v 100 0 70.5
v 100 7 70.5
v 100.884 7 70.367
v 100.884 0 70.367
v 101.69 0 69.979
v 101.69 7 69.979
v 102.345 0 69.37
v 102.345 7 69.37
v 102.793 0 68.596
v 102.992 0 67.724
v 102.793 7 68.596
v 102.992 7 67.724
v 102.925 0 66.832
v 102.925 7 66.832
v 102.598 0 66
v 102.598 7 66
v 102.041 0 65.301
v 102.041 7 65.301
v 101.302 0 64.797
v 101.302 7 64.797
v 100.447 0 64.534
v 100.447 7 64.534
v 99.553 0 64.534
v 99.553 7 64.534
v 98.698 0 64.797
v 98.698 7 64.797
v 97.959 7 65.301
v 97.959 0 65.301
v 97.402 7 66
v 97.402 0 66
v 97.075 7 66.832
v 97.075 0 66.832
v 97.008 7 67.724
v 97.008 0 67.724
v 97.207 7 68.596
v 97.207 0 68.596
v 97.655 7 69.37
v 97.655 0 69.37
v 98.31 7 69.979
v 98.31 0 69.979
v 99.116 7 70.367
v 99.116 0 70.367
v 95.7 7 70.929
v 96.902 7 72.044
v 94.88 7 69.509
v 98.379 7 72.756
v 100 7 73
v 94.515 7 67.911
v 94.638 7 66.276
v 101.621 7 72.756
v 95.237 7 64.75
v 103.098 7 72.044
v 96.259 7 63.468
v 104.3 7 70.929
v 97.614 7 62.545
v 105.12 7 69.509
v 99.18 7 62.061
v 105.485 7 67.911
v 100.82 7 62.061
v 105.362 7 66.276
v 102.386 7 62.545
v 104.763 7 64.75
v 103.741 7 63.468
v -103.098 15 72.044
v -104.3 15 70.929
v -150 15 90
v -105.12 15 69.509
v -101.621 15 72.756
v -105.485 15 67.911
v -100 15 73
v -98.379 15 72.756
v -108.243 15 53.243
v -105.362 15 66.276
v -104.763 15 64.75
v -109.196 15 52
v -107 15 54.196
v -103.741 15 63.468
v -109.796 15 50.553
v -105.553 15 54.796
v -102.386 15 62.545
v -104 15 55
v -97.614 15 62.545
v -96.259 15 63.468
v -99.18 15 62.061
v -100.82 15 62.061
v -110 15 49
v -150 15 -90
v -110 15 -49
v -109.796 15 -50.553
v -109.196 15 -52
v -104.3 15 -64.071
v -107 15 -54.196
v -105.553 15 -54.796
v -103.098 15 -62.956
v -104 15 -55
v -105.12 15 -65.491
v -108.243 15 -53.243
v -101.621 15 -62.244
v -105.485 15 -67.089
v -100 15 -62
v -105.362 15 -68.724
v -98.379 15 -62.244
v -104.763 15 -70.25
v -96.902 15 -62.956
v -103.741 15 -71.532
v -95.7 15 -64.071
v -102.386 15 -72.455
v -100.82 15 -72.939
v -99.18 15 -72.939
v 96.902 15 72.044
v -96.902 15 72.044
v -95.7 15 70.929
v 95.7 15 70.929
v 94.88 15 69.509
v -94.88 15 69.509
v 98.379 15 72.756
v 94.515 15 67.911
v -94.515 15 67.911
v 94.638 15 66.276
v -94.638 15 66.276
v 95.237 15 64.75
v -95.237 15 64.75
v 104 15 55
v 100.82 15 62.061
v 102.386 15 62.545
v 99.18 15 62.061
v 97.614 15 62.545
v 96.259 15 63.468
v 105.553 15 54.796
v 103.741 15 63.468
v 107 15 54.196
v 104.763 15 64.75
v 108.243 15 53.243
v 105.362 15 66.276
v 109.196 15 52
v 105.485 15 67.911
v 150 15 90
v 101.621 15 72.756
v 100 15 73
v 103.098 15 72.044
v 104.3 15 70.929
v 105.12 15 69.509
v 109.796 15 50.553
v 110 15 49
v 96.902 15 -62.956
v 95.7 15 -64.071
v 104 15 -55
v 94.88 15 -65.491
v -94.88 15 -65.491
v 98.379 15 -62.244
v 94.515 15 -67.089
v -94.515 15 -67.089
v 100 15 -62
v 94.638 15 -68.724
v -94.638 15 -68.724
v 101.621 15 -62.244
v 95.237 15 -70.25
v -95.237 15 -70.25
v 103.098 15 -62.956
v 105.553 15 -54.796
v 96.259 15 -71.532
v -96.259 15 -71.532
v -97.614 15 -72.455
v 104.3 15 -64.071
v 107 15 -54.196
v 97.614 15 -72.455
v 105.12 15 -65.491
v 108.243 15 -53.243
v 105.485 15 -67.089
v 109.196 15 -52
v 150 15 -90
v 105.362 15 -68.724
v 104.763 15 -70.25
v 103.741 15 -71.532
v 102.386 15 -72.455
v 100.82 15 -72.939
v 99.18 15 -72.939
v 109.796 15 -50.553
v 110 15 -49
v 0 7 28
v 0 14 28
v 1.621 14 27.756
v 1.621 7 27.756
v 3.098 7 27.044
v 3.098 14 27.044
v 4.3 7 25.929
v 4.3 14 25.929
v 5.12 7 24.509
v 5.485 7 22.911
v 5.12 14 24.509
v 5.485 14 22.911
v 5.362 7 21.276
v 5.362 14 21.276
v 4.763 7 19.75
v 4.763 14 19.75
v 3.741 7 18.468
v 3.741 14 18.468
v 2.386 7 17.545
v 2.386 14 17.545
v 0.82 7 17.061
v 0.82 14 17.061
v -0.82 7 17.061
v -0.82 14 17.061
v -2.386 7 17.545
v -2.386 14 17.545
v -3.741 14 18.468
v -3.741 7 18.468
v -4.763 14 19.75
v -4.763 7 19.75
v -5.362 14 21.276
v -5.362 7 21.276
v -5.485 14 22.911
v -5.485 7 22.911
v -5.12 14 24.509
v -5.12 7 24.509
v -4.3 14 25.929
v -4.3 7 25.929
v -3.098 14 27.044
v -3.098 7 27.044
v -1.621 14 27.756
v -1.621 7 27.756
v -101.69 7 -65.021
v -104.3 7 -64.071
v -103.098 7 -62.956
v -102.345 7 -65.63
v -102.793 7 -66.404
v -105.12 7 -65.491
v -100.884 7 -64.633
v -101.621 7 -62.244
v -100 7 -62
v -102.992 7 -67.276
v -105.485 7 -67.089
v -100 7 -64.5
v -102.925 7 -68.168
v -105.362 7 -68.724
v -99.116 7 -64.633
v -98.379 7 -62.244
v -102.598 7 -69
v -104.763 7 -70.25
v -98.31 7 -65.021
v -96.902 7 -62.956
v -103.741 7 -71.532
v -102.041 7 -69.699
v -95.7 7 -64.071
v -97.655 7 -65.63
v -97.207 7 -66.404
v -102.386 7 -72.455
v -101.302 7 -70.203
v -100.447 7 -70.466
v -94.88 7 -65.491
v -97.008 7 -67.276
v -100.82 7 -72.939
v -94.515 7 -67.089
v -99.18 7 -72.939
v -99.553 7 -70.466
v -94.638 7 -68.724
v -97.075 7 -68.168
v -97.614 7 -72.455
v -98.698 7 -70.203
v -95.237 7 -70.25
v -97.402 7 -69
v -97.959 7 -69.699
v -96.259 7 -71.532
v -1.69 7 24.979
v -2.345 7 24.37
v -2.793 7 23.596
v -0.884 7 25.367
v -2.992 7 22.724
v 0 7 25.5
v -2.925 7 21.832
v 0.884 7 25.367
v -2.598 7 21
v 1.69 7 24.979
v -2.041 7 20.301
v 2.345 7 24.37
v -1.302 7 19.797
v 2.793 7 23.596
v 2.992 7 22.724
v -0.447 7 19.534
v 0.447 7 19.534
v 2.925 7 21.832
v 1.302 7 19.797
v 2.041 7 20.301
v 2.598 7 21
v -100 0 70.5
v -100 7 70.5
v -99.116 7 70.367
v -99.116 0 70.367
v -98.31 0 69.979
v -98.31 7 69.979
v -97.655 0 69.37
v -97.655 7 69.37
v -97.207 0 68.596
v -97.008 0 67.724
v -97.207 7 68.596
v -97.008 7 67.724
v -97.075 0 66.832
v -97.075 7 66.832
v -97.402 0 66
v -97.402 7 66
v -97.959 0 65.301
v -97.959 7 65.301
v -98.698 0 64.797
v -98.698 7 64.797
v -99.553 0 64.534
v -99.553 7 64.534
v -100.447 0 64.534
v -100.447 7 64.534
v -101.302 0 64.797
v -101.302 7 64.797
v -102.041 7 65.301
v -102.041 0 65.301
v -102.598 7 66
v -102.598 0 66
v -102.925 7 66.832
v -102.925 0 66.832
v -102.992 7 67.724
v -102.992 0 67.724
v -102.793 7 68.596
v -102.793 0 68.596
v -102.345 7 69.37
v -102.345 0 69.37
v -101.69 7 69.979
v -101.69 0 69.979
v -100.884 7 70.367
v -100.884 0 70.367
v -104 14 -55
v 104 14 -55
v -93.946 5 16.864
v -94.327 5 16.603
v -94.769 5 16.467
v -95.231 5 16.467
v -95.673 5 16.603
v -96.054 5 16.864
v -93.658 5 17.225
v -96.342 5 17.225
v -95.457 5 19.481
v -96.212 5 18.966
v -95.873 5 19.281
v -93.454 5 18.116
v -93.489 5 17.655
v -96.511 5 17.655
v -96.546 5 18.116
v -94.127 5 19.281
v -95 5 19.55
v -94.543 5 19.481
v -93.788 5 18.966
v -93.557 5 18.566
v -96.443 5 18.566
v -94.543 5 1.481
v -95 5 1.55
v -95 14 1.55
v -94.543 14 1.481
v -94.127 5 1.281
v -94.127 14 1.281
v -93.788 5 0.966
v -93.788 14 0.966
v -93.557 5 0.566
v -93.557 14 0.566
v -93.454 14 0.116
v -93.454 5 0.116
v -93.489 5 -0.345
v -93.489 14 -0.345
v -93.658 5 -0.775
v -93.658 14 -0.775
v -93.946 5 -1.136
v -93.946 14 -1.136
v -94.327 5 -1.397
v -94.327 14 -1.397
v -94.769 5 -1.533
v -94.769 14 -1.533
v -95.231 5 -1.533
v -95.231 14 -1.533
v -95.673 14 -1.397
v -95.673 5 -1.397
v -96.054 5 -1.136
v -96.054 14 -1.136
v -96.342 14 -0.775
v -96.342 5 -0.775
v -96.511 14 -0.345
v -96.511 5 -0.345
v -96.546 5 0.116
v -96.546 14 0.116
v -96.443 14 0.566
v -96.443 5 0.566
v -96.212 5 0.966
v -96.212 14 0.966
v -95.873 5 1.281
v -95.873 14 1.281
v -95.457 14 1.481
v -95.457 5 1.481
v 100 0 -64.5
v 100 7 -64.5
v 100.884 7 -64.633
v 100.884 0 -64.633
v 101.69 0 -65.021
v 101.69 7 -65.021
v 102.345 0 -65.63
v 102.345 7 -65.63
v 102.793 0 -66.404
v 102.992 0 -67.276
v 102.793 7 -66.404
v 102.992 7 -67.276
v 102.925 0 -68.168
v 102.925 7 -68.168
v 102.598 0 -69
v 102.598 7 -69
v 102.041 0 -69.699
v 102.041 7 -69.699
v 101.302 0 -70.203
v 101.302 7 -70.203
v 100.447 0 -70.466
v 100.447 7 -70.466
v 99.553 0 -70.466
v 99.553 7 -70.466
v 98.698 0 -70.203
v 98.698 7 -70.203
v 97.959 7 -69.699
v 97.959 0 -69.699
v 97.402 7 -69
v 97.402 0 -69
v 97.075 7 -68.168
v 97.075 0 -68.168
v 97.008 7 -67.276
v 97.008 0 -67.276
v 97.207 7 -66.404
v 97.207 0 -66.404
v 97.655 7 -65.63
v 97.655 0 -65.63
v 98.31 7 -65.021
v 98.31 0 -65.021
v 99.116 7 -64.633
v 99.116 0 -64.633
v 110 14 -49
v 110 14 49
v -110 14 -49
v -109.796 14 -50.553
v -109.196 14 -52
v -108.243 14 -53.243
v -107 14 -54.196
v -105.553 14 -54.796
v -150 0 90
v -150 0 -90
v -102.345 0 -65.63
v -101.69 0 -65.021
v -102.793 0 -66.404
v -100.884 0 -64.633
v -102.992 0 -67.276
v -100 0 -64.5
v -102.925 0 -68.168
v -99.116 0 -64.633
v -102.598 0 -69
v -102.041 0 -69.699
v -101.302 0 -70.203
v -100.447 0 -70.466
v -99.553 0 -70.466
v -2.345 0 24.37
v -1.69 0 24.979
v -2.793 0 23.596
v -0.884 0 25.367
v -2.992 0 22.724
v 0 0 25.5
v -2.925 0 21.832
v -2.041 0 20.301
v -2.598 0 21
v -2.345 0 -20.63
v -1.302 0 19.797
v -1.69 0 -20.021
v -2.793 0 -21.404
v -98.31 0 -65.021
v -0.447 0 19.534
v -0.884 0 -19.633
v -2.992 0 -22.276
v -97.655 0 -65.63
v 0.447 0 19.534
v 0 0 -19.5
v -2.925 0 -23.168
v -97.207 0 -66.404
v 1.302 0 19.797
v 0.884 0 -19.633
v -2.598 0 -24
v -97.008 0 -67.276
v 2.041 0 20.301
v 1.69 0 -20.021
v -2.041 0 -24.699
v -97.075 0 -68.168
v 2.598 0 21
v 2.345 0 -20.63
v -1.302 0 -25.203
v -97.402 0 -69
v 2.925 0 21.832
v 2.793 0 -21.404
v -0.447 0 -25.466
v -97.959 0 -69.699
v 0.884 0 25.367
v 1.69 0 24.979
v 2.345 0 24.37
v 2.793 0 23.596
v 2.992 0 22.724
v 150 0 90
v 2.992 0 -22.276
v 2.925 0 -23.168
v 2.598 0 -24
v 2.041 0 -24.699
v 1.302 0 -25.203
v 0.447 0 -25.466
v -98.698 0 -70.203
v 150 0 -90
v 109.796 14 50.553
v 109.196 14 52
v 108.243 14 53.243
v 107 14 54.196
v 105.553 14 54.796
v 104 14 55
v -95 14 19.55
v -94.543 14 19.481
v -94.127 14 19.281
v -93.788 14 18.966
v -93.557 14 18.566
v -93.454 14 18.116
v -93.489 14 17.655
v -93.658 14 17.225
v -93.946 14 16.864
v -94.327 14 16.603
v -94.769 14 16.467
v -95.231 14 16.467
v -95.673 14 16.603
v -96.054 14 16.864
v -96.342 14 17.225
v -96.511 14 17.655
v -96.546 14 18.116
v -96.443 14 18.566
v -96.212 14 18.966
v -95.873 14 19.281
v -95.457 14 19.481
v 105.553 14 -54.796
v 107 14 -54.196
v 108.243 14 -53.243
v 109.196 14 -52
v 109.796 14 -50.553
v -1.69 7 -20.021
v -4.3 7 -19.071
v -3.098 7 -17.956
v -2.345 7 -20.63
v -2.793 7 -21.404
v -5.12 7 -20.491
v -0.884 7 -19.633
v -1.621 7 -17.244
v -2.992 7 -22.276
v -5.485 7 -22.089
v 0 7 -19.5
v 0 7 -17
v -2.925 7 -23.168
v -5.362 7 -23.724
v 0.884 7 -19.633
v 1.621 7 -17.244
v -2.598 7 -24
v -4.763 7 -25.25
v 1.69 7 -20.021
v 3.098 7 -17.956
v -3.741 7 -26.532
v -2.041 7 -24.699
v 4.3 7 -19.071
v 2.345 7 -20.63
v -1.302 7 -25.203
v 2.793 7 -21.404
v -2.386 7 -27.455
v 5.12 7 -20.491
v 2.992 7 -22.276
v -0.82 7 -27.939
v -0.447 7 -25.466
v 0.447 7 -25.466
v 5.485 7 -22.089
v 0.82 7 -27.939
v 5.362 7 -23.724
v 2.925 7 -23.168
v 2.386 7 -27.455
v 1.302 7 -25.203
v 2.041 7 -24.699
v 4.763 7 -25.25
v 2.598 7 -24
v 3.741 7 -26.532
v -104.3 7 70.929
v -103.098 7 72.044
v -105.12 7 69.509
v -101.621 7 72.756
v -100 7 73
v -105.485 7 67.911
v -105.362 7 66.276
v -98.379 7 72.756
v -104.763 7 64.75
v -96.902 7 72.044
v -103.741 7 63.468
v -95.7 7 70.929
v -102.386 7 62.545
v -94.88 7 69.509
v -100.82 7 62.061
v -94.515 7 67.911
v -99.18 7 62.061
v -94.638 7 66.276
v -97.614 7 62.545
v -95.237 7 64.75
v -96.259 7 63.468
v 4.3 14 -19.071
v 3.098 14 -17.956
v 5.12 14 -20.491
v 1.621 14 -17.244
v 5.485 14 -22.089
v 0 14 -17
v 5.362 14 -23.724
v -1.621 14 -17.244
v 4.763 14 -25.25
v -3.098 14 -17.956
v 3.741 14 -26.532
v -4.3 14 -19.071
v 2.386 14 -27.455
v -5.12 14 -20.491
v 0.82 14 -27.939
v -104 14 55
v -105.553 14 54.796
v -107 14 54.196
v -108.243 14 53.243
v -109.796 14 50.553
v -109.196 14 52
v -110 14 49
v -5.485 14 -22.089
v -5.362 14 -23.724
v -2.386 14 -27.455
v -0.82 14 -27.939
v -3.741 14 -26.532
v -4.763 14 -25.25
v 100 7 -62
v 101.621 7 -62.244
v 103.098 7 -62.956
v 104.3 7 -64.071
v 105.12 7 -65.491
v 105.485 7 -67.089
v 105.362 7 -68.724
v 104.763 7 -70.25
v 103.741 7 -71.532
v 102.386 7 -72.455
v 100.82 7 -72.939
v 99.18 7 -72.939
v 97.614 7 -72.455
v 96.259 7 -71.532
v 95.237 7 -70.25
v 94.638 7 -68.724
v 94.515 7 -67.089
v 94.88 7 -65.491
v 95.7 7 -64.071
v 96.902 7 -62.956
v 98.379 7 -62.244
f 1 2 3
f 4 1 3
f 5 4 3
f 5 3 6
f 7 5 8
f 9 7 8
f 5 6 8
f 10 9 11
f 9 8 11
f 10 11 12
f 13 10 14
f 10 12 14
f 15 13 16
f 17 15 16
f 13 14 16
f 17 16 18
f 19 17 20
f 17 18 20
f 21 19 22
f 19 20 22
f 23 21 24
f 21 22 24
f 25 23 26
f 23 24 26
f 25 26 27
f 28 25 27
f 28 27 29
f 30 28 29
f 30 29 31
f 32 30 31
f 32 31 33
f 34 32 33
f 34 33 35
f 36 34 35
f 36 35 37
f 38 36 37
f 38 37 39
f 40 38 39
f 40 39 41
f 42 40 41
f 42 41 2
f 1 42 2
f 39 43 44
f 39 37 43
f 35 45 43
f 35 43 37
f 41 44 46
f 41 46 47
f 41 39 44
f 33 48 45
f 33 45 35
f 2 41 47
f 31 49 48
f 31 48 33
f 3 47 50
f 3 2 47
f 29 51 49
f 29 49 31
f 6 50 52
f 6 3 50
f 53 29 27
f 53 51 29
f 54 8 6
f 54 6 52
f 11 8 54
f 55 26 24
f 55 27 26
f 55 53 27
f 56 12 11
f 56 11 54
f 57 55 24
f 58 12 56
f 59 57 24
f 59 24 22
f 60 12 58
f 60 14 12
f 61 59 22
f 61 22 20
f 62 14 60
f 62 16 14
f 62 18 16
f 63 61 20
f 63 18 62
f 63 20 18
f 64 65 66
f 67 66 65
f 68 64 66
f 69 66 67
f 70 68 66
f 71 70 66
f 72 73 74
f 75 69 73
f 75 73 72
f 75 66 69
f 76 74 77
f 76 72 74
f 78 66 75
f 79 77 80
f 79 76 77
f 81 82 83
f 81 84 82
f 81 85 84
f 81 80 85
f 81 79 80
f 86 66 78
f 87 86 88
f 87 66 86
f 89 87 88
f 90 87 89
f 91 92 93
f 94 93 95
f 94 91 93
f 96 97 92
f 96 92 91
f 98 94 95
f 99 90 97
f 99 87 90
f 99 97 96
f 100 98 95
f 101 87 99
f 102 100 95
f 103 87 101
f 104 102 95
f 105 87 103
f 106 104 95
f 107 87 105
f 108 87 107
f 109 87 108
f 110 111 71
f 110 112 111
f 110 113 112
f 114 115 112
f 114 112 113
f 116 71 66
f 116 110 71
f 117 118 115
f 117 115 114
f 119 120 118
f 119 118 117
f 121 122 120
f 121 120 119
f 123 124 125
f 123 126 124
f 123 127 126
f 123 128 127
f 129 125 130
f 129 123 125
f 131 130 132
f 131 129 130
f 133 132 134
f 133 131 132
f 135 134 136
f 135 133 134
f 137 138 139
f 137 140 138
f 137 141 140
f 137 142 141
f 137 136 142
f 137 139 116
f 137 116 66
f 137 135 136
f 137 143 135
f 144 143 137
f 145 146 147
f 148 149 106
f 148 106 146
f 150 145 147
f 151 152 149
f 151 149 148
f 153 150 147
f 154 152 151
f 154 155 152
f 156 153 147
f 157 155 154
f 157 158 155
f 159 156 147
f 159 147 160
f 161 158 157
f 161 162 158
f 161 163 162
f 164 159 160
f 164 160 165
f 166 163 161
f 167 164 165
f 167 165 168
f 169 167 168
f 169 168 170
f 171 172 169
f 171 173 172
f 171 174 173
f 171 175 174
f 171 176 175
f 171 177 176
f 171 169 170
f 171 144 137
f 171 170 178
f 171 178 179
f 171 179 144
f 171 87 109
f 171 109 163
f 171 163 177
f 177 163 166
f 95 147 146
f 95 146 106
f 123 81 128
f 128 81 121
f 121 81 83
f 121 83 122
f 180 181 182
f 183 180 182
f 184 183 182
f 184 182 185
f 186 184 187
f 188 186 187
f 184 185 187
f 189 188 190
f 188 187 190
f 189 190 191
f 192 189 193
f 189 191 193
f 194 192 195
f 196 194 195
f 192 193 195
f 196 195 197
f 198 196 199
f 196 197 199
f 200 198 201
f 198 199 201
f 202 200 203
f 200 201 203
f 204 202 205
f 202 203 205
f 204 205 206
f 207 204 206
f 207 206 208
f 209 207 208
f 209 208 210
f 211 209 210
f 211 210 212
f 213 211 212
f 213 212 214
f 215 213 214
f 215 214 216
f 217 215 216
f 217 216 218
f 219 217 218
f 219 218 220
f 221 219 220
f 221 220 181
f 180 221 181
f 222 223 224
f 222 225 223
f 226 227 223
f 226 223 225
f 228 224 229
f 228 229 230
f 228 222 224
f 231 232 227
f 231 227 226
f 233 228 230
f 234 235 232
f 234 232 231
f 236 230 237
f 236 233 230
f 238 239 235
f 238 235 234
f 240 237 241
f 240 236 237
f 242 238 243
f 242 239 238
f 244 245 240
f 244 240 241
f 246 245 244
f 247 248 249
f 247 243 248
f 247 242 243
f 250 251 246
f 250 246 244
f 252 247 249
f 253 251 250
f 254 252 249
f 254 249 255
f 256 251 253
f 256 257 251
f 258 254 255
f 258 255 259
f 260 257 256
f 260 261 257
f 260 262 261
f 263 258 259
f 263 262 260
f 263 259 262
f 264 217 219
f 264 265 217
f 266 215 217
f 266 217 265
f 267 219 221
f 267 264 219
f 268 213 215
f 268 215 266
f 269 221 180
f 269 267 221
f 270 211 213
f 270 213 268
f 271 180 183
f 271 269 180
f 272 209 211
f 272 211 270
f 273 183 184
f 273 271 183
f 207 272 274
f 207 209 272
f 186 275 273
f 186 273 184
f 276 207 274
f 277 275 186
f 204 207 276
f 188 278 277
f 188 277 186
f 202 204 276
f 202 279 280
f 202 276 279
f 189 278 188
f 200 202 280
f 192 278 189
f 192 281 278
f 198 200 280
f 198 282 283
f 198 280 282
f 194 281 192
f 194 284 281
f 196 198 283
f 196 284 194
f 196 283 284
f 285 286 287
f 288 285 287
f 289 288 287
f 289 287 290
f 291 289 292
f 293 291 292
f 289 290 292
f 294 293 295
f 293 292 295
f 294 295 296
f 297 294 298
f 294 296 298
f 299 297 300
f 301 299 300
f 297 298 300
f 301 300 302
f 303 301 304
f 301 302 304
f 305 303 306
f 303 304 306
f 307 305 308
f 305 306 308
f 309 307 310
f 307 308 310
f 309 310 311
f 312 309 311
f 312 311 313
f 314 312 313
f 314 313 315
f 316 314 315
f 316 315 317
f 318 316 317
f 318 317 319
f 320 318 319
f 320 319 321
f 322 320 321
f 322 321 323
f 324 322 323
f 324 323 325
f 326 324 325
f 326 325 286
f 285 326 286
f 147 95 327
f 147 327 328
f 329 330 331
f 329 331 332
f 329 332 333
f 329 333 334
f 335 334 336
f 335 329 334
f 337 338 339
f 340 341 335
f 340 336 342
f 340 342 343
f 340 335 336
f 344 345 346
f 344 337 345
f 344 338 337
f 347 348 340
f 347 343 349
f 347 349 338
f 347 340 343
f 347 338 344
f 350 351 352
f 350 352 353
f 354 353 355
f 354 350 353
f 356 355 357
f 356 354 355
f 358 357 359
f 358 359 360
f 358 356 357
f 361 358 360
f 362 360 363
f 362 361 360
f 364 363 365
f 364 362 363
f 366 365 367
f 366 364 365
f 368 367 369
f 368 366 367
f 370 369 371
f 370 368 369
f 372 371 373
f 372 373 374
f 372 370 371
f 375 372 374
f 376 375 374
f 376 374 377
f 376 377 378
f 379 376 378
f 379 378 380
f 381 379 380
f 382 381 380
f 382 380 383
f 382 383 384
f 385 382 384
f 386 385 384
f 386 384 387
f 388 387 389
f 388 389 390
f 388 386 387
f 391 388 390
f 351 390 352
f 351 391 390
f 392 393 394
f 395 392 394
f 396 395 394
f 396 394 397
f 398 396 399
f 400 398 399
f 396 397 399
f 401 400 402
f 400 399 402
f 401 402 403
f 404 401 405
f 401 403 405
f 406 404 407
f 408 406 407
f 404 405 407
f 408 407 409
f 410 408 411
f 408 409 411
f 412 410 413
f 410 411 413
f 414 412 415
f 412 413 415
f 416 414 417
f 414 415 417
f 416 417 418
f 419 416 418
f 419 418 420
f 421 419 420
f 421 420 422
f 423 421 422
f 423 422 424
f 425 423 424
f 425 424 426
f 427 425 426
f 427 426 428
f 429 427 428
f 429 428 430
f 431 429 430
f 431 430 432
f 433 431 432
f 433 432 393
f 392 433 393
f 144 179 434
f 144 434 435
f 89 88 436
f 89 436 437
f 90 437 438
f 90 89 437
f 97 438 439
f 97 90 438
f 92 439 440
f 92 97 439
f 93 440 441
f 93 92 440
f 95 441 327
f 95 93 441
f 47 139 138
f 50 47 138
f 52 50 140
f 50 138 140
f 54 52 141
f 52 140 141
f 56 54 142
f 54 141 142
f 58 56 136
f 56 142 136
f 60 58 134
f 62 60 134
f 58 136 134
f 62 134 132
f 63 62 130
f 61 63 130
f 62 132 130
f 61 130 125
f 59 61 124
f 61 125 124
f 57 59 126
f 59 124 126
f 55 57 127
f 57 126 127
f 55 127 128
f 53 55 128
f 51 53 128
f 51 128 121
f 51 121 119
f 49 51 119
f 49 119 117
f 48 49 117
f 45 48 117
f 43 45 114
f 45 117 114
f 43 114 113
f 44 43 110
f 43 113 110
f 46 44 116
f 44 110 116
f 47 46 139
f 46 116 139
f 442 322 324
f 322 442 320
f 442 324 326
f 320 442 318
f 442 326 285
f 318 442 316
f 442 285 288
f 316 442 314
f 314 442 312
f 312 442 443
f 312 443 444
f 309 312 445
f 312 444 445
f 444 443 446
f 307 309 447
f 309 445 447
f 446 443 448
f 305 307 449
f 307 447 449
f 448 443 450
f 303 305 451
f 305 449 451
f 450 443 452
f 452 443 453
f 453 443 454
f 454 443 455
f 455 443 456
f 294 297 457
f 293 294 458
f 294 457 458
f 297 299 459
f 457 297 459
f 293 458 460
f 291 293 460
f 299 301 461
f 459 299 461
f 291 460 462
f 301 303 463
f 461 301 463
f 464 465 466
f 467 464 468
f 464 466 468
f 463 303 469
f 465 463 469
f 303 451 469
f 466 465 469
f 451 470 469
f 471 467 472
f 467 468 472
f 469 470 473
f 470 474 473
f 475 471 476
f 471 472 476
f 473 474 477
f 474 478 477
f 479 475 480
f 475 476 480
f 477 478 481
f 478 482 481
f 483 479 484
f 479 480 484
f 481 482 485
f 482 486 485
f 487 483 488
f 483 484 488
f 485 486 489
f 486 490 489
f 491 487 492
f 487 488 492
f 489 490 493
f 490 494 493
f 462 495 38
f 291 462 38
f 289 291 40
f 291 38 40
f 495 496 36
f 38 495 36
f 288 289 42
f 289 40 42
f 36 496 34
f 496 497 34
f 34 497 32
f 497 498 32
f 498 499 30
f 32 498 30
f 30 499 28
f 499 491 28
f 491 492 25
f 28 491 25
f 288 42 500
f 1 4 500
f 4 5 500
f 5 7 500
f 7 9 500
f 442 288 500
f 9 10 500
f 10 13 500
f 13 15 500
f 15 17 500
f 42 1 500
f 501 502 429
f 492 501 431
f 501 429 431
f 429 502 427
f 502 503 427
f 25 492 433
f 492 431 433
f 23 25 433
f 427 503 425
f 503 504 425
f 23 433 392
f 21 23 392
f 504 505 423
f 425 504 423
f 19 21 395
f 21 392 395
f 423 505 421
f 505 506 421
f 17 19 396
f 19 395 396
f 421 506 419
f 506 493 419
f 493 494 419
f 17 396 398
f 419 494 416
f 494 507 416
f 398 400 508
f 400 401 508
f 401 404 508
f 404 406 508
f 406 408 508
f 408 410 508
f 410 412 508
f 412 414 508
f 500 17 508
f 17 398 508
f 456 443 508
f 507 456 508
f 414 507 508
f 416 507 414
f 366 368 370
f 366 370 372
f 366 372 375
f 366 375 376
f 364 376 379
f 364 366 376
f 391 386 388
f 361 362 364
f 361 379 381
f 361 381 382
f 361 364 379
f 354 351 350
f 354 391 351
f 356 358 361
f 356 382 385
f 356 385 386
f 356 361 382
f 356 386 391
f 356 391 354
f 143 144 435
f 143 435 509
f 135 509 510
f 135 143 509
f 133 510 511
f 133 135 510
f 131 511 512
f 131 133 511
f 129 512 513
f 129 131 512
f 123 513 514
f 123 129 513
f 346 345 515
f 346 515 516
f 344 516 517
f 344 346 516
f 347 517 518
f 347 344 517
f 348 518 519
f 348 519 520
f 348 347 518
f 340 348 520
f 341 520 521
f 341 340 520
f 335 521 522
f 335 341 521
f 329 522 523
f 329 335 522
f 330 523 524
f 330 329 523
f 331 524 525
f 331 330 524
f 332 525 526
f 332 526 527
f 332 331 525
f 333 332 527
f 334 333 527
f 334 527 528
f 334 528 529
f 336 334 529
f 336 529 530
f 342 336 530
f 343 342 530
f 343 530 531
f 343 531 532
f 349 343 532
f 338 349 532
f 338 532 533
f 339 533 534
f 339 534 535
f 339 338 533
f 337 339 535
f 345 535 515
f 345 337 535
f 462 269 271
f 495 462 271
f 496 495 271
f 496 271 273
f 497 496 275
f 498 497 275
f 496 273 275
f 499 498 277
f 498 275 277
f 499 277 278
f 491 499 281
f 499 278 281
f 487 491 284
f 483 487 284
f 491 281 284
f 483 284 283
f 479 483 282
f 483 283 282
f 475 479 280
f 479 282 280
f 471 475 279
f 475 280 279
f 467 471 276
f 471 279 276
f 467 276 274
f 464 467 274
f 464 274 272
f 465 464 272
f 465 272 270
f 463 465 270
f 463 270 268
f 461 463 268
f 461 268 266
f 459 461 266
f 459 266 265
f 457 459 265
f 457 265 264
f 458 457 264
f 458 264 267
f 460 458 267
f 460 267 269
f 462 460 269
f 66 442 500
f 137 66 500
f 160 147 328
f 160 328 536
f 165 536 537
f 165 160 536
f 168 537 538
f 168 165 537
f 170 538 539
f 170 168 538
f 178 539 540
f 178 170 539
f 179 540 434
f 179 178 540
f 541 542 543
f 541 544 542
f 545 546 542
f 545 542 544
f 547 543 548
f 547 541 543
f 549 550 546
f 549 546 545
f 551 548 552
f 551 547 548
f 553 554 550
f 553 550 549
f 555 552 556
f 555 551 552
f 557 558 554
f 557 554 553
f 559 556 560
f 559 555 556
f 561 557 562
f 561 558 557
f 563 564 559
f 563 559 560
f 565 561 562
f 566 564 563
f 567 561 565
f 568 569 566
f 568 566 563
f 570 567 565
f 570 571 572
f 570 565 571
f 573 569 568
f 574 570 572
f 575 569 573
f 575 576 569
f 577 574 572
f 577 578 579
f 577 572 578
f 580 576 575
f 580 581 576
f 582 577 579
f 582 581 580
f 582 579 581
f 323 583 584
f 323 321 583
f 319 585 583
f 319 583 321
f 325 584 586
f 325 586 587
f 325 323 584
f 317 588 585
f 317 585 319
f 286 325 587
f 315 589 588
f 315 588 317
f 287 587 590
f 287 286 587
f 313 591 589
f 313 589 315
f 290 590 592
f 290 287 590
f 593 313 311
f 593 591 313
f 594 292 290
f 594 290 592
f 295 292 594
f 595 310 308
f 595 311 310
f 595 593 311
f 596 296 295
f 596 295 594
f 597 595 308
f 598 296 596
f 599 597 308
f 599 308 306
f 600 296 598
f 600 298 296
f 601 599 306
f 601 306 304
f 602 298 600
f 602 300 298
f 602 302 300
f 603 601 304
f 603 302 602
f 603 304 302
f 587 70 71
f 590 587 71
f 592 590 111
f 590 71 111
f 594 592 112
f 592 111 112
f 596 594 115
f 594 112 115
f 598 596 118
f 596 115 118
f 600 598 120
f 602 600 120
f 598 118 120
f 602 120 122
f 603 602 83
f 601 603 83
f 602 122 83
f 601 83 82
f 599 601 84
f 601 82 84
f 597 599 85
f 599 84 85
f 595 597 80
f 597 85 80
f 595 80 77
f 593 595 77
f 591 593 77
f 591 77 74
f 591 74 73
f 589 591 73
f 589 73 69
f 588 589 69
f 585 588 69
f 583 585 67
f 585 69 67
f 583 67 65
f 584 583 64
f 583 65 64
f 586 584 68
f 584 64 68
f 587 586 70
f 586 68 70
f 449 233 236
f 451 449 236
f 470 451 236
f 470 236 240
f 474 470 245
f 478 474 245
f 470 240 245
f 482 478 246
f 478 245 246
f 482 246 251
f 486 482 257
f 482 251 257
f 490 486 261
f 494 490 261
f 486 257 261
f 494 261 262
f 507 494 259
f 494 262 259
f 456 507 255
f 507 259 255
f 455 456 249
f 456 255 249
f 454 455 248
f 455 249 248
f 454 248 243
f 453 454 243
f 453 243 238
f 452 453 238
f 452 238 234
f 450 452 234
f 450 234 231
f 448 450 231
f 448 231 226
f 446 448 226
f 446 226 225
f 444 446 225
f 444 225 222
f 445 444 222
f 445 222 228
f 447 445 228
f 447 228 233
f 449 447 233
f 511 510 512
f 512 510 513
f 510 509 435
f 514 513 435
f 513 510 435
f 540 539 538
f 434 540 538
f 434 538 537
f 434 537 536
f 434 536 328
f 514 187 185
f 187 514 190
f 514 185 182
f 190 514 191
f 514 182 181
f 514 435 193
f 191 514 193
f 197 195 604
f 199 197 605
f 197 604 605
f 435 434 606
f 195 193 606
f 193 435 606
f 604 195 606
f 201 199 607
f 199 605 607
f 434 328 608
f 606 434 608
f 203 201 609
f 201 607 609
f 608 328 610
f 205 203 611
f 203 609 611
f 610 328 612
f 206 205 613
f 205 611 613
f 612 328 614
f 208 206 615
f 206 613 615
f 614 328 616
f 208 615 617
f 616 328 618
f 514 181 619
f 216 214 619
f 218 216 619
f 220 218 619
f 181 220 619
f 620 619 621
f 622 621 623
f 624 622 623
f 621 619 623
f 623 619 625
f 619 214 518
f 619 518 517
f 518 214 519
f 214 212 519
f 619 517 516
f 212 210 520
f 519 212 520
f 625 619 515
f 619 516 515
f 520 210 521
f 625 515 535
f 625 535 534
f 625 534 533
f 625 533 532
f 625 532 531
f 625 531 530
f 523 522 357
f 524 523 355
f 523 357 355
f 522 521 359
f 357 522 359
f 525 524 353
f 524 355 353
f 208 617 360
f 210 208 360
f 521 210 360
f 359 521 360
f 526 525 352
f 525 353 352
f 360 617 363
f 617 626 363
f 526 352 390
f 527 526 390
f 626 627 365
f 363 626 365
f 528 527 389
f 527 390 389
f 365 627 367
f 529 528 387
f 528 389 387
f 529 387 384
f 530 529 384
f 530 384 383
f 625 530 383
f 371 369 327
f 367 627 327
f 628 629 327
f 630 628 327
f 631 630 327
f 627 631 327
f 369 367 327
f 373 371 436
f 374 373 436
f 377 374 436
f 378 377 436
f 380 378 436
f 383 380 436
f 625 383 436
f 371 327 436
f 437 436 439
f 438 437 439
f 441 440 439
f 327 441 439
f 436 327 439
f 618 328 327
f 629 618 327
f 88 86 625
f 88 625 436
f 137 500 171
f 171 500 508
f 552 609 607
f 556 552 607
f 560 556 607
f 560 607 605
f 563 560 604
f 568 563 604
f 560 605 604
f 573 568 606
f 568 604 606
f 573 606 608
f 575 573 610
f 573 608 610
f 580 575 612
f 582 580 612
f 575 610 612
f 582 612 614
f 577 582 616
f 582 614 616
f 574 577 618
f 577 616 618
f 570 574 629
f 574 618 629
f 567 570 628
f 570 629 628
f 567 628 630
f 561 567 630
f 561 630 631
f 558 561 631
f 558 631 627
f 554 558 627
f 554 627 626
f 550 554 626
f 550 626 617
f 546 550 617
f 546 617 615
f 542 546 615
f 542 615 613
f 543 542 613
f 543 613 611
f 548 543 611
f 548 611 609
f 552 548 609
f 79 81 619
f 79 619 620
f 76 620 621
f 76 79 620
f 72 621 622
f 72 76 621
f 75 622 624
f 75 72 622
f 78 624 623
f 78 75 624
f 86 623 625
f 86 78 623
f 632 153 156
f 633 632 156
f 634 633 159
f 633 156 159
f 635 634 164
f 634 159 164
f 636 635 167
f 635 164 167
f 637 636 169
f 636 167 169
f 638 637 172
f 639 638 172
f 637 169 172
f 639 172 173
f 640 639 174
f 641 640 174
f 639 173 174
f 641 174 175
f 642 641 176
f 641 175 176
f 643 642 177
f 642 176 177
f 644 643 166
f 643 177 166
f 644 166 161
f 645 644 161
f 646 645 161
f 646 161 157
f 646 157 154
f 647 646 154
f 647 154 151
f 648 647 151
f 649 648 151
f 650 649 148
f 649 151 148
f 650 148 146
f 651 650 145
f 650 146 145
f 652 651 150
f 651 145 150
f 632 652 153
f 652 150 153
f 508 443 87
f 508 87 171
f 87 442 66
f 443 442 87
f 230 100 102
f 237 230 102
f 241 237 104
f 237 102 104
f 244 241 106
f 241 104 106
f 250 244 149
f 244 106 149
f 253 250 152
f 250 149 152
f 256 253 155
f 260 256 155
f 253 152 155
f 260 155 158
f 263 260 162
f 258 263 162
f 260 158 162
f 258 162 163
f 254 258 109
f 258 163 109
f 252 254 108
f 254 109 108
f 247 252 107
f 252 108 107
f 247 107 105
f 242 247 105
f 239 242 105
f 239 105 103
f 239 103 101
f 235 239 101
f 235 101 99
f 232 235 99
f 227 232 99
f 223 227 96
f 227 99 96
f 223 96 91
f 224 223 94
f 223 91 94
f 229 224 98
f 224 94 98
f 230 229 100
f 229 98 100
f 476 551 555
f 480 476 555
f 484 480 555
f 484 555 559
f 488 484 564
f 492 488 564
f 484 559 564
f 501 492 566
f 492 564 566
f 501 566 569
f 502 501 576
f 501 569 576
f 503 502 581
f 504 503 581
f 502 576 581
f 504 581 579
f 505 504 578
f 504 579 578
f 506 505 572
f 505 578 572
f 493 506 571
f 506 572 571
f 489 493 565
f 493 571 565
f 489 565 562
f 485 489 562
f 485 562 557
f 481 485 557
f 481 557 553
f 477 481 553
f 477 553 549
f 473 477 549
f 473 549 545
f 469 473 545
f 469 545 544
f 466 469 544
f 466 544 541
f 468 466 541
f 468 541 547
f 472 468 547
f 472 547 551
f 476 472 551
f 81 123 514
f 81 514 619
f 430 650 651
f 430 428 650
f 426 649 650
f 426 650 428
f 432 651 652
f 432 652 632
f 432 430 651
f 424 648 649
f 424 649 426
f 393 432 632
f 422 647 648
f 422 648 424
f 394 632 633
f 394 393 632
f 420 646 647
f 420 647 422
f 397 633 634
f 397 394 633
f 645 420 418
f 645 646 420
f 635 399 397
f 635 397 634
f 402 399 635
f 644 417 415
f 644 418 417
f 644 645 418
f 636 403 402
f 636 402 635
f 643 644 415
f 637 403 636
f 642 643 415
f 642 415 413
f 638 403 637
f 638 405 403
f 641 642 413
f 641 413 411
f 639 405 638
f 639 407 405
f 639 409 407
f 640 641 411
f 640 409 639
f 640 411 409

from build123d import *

# Parameters (mm, degrees)
SKETCH_1_W          = 300
SKETCH_1_H          = 180
EXTRUDE_1_DEPTH     = 15
SKETCH_2_R          = 3
SKETCH_2_R_2        = 2.5
CUT_EXTRUDE_1_DEPTH = 176.570498661
SKETCH_3_R          = 5.5
SKETCH_3_R_2        = 5
SKETCH_3_R_3        = 3
CUT_EXTRUDE_3_DEPTH = 8
CUT_EXTRUDE_4_DEPTH = 1
CUT_EXTRUDE_START   = -9
SKETCH_6_R          = 1.55
CUT_EXTRUDE_6_DEPTH = 9


with BuildPart() as part:
    # Эскиз1 → Бобышка-Вытянуть1 (new body)
    with BuildSketch(Plane(origin=(0, 0, 0), x_dir=(1, 0, 0), z_dir=(0, 1, 0))):
        Rectangle(SKETCH_1_W, SKETCH_1_H)
    extrude(amount=EXTRUDE_1_DEPTH)

    # Эскиз2 → Вырез-Вытянуть1 (cut, through all)
    # profile 1 of 12: a face of its own
    with BuildSketch(Plane(origin=(0, 15, 0), x_dir=(1, 0, 0), z_dir=(0, 1, 0))):
        with Locations(Location((0, -22.5, 0), (0, 0, 270))):
            Circle(SKETCH_2_R)
        with Locations((0, -22.5)):
            Circle(SKETCH_2_R_2, mode=Mode.SUBTRACT)
    # profile 2 of 12: a face of its own
    with BuildSketch(Plane(origin=(0, 15, 0), x_dir=(1, 0, 0), z_dir=(0, 1, 0))):
        with Locations((0, -22.5)):
            Circle(SKETCH_2_R_2)
    # profile 3 of 12: a face of its own
    with BuildSketch(Plane(origin=(0, 15, 0), x_dir=(1, 0, 0), z_dir=(0, 1, 0))):
        with Locations(Location((-100, -67.5, 0), (0, 0, 270))):
            Circle(SKETCH_2_R)
        with Locations((-100, -67.5)):
            Circle(SKETCH_2_R_2, mode=Mode.SUBTRACT)
    # profile 4 of 12: a face of its own
    with BuildSketch(Plane(origin=(0, 15, 0), x_dir=(1, 0, 0), z_dir=(0, 1, 0))):
        with Locations((-100, -67.5)):
            Circle(SKETCH_2_R_2)
    # profile 5 of 12: a face of its own
    with BuildSketch(Plane(origin=(0, 15, 0), x_dir=(1, 0, 0), z_dir=(0, 1, 0))):
        with Locations(Location((100, -67.5, 0), (0, 0, 270))):
            Circle(SKETCH_2_R)
        with Locations((100, -67.5)):
            Circle(SKETCH_2_R_2, mode=Mode.SUBTRACT)
    # profile 6 of 12: a face of its own
    with BuildSketch(Plane(origin=(0, 15, 0), x_dir=(1, 0, 0), z_dir=(0, 1, 0))):
        with Locations((100, -67.5)):
            Circle(SKETCH_2_R_2)
    # profile 7 of 12: a face of its own
    with BuildSketch(Plane(origin=(0, 15, 0), x_dir=(1, 0, 0), z_dir=(0, 1, 0))):
        with Locations(Location((100, 67.5, 0), (0, 0, 270))):
            Circle(SKETCH_2_R)
        with Locations((100, 67.5)):
            Circle(SKETCH_2_R_2, mode=Mode.SUBTRACT)
    # profile 8 of 12: a face of its own
    with BuildSketch(Plane(origin=(0, 15, 0), x_dir=(1, 0, 0), z_dir=(0, 1, 0))):
        with Locations((100, 67.5)):
            Circle(SKETCH_2_R_2)
    # profile 9 of 12: a face of its own
    with BuildSketch(Plane(origin=(0, 15, 0), x_dir=(1, 0, 0), z_dir=(0, 1, 0))):
        with Locations(Location((0, 22.5, 0), (0, 0, 270))):
            Circle(SKETCH_2_R)
        with Locations((0, 22.5)):
            Circle(SKETCH_2_R_2, mode=Mode.SUBTRACT)
    # profile 10 of 12: a face of its own
    with BuildSketch(Plane(origin=(0, 15, 0), x_dir=(1, 0, 0), z_dir=(0, 1, 0))):
        with Locations((0, 22.5)):
            Circle(SKETCH_2_R_2)
    # profile 11 of 12: a face of its own
    with BuildSketch(Plane(origin=(0, 15, 0), x_dir=(1, 0, 0), z_dir=(0, 1, 0))):
        with Locations(Location((-100, 67.5, 0), (0, 0, 270))):
            Circle(SKETCH_2_R)
        with Locations((-100, 67.5)):
            Circle(SKETCH_2_R_2, mode=Mode.SUBTRACT)
    # profile 12 of 12: a face of its own
    with BuildSketch(Plane(origin=(0, 15, 0), x_dir=(1, 0, 0), z_dir=(0, 1, 0))):
        with Locations((-100, 67.5)):
            Circle(SKETCH_2_R_2)
    extrude(amount=-CUT_EXTRUDE_1_DEPTH, mode=Mode.SUBTRACT)

    # Эскиз3 → Вырез-Вытянуть3 (cut)
    # profile 1 of 12: a face of its own
    with BuildSketch(Plane(origin=(0, 15, 0), x_dir=(1, 0, 0), z_dir=(0, 1, 0))):
        with Locations(Location((0, -22.5, 0), (0, 0, 270))):
            Circle(SKETCH_3_R)
        with Locations((0, -22.5)):
            Circle(SKETCH_3_R_2, mode=Mode.SUBTRACT)
    # profile 2 of 12: a face of its own
    with BuildSketch(Plane(origin=(0, 15, 0), x_dir=(1, 0, 0), z_dir=(0, 1, 0))):
        with Locations((0, -22.5)):
            Circle(SKETCH_3_R_2)
        with Locations(Location((0, -22.5, 0), (0, 0, 270))):
            Circle(SKETCH_3_R_3, mode=Mode.SUBTRACT)
    # profile 3 of 12: a face of its own
    with BuildSketch(Plane(origin=(0, 15, 0), x_dir=(1, 0, 0), z_dir=(0, 1, 0))):
        with Locations(Location((-100, -67.5, 0), (0, 0, 270))):
            Circle(SKETCH_3_R)
        with Locations((-100, -67.5)):
            Circle(SKETCH_3_R_2, mode=Mode.SUBTRACT)
    # profile 4 of 12: a face of its own
    with BuildSketch(Plane(origin=(0, 15, 0), x_dir=(1, 0, 0), z_dir=(0, 1, 0))):
        with Locations((-100, -67.5)):
            Circle(SKETCH_3_R_2)
        with Locations(Location((-100, -67.5, 0), (0, 0, 270))):
            Circle(SKETCH_3_R_3, mode=Mode.SUBTRACT)
    # profile 5 of 12: a face of its own
    with BuildSketch(Plane(origin=(0, 15, 0), x_dir=(1, 0, 0), z_dir=(0, 1, 0))):
        with Locations(Location((100, -67.5, 0), (0, 0, 270))):
            Circle(SKETCH_3_R)
        with Locations((100, -67.5)):
            Circle(SKETCH_3_R_2, mode=Mode.SUBTRACT)
    # profile 6 of 12: a face of its own
    with BuildSketch(Plane(origin=(0, 15, 0), x_dir=(1, 0, 0), z_dir=(0, 1, 0))):
        with Locations((100, -67.5)):
            Circle(SKETCH_3_R_2)
        with Locations(Location((100, -67.5, 0), (0, 0, 270))):
            Circle(SKETCH_3_R_3, mode=Mode.SUBTRACT)
    # profile 7 of 12: a face of its own
    with BuildSketch(Plane(origin=(0, 15, 0), x_dir=(1, 0, 0), z_dir=(0, 1, 0))):
        with Locations(Location((0, 22.5, 0), (0, 0, 270))):
            Circle(SKETCH_3_R)
        with Locations((0, 22.5)):
            Circle(SKETCH_3_R_2, mode=Mode.SUBTRACT)
    # profile 8 of 12: a face of its own
    with BuildSketch(Plane(origin=(0, 15, 0), x_dir=(1, 0, 0), z_dir=(0, 1, 0))):
        with Locations((0, 22.5)):
            Circle(SKETCH_3_R_2)
        with Locations(Location((0, 22.5, 0), (0, 0, 270))):
            Circle(SKETCH_3_R_3, mode=Mode.SUBTRACT)
    # profile 9 of 12: a face of its own
    with BuildSketch(Plane(origin=(0, 15, 0), x_dir=(1, 0, 0), z_dir=(0, 1, 0))):
        with Locations(Location((-100, 67.5, 0), (0, 0, 270))):
            Circle(SKETCH_3_R)
        with Locations((-100, 67.5)):
            Circle(SKETCH_3_R_2, mode=Mode.SUBTRACT)
    # profile 10 of 12: a face of its own
    with BuildSketch(Plane(origin=(0, 15, 0), x_dir=(1, 0, 0), z_dir=(0, 1, 0))):
        with Locations((-100, 67.5)):
            Circle(SKETCH_3_R_2)
        with Locations(Location((-100, 67.5, 0), (0, 0, 270))):
            Circle(SKETCH_3_R_3, mode=Mode.SUBTRACT)
    # profile 11 of 12: a face of its own
    with BuildSketch(Plane(origin=(0, 15, 0), x_dir=(1, 0, 0), z_dir=(0, 1, 0))):
        with Locations(Location((100, 67.5, 0), (0, 0, 270))):
            Circle(SKETCH_3_R)
        with Locations((100, 67.5)):
            Circle(SKETCH_3_R_2, mode=Mode.SUBTRACT)
    # profile 12 of 12: a face of its own
    with BuildSketch(Plane(origin=(0, 15, 0), x_dir=(1, 0, 0), z_dir=(0, 1, 0))):
        with Locations((100, 67.5)):
            Circle(SKETCH_3_R_2)
        with Locations(Location((100, 67.5, 0), (0, 0, 270))):
            Circle(SKETCH_3_R_3, mode=Mode.SUBTRACT)
    extrude(amount=-CUT_EXTRUDE_3_DEPTH, mode=Mode.SUBTRACT)

    # Эскиз4 → Вырез-Вытянуть4 (cut)
    with BuildSketch(Plane(origin=(0, 15, 0), x_dir=(1, 0, 0), z_dir=(0, 1, 0))):
        with BuildLine():
            Line((-110, -49), (-110, 49))
            ThreePointArc((-110, 49), (-108.242640687, 53.242640687), (-104, 55))
            Line((-104, 55), (104, 55))
            ThreePointArc((104, 55), (108.242640687, 53.242640687), (110, 49))
            Line((110, 49), (110, -49))
            ThreePointArc((110, -49), (108.242640687, -53.242640687), (104, -55))
            Line((104, -55), (-104, -55))
            ThreePointArc((-104, -55), (-108.242640687, -53.242640687), (-110, -49))
        make_face()
    extrude(amount=-CUT_EXTRUDE_4_DEPTH, mode=Mode.SUBTRACT)

    # Эскиз6 → Вырез-Вытянуть6 (cut)
    with BuildSketch(Plane(origin=(0, 14, 0), x_dir=(1, 0, 0), z_dir=(0, 1, 0)).offset(CUT_EXTRUDE_START)):
        with Locations(Location((-95, -18, 0), (0, 0, 270))):
            Circle(SKETCH_6_R)
        with Locations(Location((-95, 0, 0), (0, 0, 270))):
            Circle(SKETCH_6_R)
    extrude(amount=CUT_EXTRUDE_6_DEPTH, mode=Mode.SUBTRACT)


solid = part.part
